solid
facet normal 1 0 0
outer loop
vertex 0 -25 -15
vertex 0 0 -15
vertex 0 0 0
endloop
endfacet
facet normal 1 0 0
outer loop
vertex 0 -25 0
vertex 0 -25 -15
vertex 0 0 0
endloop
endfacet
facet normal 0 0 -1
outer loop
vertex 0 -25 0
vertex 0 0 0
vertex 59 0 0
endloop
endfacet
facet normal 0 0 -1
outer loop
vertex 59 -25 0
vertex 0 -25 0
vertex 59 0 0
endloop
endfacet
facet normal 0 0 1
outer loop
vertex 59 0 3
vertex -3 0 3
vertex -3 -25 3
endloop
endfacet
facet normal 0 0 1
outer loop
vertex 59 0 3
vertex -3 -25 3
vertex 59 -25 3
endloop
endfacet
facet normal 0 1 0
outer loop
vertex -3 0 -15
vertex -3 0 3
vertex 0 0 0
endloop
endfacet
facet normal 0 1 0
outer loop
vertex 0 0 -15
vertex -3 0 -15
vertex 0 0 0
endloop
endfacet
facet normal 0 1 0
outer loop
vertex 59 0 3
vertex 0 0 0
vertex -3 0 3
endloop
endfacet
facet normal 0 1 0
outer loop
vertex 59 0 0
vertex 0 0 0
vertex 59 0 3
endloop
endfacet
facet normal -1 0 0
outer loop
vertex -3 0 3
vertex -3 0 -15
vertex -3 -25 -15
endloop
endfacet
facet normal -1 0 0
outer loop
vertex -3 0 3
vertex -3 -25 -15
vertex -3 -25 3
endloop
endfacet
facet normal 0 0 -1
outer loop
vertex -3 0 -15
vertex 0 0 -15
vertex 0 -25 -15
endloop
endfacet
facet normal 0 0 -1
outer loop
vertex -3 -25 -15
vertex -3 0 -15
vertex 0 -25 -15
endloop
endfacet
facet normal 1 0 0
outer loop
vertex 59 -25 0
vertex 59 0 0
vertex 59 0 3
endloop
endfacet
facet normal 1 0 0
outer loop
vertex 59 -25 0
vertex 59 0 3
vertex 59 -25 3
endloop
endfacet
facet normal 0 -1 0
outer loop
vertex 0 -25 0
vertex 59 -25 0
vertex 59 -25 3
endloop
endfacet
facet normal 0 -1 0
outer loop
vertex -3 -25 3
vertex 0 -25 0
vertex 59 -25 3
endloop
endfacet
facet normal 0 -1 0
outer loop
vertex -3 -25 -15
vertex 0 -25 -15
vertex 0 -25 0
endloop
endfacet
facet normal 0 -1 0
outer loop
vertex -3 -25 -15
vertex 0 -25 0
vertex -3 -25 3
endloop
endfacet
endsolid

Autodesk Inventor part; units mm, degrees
ref_plane "YZ Plane" through (0, 0, 0) normal (1, 0, 0) x (0, 1, 0)
ref_plane "XZ Plane" through (0, 0, 0) normal (0, 1, 0) x (-1, 0, 0)
ref_plane "XY Plane" through (0, 0, 0) normal (0, 0, 1) x (1, 0, 0)
sketch "Sketch1" plane through (0, 0, 0) normal (0, 0, 1) x (1, 0, 0)
  line L0 (0, 0) -> (59, 0)
  line L1 (59, 0) -> (59, -25)
  line L2 (59, -25) -> (0, -25)
  line L3 (0, -25) -> (0, 0)
  dimension "d0" = 59
  dimension "d1" = 25
extrude "Extrusion1" add sketch "Sketch1" along normal blind 3
sketch "Sketch2" plane through (0, -25, 0) normal (-1, 0, 0) x (0, 0, 1)
  line L0 (3, 0) -> (3, 25) projected
  line L1 (3, 25) -> (-15, 25)
  line L2 (-15, 25) -> (-15, 0)
  line L3 (-15, 0) -> (3, 0)
  line L4 (3, 0) -> (3, 25)
  point P0 (0, 25)
  dimension "d4" = 18
extrude "Extrusion2" add sketch "Sketch2" along normal blind 3
properties part number "arduino array box v03 slot"
